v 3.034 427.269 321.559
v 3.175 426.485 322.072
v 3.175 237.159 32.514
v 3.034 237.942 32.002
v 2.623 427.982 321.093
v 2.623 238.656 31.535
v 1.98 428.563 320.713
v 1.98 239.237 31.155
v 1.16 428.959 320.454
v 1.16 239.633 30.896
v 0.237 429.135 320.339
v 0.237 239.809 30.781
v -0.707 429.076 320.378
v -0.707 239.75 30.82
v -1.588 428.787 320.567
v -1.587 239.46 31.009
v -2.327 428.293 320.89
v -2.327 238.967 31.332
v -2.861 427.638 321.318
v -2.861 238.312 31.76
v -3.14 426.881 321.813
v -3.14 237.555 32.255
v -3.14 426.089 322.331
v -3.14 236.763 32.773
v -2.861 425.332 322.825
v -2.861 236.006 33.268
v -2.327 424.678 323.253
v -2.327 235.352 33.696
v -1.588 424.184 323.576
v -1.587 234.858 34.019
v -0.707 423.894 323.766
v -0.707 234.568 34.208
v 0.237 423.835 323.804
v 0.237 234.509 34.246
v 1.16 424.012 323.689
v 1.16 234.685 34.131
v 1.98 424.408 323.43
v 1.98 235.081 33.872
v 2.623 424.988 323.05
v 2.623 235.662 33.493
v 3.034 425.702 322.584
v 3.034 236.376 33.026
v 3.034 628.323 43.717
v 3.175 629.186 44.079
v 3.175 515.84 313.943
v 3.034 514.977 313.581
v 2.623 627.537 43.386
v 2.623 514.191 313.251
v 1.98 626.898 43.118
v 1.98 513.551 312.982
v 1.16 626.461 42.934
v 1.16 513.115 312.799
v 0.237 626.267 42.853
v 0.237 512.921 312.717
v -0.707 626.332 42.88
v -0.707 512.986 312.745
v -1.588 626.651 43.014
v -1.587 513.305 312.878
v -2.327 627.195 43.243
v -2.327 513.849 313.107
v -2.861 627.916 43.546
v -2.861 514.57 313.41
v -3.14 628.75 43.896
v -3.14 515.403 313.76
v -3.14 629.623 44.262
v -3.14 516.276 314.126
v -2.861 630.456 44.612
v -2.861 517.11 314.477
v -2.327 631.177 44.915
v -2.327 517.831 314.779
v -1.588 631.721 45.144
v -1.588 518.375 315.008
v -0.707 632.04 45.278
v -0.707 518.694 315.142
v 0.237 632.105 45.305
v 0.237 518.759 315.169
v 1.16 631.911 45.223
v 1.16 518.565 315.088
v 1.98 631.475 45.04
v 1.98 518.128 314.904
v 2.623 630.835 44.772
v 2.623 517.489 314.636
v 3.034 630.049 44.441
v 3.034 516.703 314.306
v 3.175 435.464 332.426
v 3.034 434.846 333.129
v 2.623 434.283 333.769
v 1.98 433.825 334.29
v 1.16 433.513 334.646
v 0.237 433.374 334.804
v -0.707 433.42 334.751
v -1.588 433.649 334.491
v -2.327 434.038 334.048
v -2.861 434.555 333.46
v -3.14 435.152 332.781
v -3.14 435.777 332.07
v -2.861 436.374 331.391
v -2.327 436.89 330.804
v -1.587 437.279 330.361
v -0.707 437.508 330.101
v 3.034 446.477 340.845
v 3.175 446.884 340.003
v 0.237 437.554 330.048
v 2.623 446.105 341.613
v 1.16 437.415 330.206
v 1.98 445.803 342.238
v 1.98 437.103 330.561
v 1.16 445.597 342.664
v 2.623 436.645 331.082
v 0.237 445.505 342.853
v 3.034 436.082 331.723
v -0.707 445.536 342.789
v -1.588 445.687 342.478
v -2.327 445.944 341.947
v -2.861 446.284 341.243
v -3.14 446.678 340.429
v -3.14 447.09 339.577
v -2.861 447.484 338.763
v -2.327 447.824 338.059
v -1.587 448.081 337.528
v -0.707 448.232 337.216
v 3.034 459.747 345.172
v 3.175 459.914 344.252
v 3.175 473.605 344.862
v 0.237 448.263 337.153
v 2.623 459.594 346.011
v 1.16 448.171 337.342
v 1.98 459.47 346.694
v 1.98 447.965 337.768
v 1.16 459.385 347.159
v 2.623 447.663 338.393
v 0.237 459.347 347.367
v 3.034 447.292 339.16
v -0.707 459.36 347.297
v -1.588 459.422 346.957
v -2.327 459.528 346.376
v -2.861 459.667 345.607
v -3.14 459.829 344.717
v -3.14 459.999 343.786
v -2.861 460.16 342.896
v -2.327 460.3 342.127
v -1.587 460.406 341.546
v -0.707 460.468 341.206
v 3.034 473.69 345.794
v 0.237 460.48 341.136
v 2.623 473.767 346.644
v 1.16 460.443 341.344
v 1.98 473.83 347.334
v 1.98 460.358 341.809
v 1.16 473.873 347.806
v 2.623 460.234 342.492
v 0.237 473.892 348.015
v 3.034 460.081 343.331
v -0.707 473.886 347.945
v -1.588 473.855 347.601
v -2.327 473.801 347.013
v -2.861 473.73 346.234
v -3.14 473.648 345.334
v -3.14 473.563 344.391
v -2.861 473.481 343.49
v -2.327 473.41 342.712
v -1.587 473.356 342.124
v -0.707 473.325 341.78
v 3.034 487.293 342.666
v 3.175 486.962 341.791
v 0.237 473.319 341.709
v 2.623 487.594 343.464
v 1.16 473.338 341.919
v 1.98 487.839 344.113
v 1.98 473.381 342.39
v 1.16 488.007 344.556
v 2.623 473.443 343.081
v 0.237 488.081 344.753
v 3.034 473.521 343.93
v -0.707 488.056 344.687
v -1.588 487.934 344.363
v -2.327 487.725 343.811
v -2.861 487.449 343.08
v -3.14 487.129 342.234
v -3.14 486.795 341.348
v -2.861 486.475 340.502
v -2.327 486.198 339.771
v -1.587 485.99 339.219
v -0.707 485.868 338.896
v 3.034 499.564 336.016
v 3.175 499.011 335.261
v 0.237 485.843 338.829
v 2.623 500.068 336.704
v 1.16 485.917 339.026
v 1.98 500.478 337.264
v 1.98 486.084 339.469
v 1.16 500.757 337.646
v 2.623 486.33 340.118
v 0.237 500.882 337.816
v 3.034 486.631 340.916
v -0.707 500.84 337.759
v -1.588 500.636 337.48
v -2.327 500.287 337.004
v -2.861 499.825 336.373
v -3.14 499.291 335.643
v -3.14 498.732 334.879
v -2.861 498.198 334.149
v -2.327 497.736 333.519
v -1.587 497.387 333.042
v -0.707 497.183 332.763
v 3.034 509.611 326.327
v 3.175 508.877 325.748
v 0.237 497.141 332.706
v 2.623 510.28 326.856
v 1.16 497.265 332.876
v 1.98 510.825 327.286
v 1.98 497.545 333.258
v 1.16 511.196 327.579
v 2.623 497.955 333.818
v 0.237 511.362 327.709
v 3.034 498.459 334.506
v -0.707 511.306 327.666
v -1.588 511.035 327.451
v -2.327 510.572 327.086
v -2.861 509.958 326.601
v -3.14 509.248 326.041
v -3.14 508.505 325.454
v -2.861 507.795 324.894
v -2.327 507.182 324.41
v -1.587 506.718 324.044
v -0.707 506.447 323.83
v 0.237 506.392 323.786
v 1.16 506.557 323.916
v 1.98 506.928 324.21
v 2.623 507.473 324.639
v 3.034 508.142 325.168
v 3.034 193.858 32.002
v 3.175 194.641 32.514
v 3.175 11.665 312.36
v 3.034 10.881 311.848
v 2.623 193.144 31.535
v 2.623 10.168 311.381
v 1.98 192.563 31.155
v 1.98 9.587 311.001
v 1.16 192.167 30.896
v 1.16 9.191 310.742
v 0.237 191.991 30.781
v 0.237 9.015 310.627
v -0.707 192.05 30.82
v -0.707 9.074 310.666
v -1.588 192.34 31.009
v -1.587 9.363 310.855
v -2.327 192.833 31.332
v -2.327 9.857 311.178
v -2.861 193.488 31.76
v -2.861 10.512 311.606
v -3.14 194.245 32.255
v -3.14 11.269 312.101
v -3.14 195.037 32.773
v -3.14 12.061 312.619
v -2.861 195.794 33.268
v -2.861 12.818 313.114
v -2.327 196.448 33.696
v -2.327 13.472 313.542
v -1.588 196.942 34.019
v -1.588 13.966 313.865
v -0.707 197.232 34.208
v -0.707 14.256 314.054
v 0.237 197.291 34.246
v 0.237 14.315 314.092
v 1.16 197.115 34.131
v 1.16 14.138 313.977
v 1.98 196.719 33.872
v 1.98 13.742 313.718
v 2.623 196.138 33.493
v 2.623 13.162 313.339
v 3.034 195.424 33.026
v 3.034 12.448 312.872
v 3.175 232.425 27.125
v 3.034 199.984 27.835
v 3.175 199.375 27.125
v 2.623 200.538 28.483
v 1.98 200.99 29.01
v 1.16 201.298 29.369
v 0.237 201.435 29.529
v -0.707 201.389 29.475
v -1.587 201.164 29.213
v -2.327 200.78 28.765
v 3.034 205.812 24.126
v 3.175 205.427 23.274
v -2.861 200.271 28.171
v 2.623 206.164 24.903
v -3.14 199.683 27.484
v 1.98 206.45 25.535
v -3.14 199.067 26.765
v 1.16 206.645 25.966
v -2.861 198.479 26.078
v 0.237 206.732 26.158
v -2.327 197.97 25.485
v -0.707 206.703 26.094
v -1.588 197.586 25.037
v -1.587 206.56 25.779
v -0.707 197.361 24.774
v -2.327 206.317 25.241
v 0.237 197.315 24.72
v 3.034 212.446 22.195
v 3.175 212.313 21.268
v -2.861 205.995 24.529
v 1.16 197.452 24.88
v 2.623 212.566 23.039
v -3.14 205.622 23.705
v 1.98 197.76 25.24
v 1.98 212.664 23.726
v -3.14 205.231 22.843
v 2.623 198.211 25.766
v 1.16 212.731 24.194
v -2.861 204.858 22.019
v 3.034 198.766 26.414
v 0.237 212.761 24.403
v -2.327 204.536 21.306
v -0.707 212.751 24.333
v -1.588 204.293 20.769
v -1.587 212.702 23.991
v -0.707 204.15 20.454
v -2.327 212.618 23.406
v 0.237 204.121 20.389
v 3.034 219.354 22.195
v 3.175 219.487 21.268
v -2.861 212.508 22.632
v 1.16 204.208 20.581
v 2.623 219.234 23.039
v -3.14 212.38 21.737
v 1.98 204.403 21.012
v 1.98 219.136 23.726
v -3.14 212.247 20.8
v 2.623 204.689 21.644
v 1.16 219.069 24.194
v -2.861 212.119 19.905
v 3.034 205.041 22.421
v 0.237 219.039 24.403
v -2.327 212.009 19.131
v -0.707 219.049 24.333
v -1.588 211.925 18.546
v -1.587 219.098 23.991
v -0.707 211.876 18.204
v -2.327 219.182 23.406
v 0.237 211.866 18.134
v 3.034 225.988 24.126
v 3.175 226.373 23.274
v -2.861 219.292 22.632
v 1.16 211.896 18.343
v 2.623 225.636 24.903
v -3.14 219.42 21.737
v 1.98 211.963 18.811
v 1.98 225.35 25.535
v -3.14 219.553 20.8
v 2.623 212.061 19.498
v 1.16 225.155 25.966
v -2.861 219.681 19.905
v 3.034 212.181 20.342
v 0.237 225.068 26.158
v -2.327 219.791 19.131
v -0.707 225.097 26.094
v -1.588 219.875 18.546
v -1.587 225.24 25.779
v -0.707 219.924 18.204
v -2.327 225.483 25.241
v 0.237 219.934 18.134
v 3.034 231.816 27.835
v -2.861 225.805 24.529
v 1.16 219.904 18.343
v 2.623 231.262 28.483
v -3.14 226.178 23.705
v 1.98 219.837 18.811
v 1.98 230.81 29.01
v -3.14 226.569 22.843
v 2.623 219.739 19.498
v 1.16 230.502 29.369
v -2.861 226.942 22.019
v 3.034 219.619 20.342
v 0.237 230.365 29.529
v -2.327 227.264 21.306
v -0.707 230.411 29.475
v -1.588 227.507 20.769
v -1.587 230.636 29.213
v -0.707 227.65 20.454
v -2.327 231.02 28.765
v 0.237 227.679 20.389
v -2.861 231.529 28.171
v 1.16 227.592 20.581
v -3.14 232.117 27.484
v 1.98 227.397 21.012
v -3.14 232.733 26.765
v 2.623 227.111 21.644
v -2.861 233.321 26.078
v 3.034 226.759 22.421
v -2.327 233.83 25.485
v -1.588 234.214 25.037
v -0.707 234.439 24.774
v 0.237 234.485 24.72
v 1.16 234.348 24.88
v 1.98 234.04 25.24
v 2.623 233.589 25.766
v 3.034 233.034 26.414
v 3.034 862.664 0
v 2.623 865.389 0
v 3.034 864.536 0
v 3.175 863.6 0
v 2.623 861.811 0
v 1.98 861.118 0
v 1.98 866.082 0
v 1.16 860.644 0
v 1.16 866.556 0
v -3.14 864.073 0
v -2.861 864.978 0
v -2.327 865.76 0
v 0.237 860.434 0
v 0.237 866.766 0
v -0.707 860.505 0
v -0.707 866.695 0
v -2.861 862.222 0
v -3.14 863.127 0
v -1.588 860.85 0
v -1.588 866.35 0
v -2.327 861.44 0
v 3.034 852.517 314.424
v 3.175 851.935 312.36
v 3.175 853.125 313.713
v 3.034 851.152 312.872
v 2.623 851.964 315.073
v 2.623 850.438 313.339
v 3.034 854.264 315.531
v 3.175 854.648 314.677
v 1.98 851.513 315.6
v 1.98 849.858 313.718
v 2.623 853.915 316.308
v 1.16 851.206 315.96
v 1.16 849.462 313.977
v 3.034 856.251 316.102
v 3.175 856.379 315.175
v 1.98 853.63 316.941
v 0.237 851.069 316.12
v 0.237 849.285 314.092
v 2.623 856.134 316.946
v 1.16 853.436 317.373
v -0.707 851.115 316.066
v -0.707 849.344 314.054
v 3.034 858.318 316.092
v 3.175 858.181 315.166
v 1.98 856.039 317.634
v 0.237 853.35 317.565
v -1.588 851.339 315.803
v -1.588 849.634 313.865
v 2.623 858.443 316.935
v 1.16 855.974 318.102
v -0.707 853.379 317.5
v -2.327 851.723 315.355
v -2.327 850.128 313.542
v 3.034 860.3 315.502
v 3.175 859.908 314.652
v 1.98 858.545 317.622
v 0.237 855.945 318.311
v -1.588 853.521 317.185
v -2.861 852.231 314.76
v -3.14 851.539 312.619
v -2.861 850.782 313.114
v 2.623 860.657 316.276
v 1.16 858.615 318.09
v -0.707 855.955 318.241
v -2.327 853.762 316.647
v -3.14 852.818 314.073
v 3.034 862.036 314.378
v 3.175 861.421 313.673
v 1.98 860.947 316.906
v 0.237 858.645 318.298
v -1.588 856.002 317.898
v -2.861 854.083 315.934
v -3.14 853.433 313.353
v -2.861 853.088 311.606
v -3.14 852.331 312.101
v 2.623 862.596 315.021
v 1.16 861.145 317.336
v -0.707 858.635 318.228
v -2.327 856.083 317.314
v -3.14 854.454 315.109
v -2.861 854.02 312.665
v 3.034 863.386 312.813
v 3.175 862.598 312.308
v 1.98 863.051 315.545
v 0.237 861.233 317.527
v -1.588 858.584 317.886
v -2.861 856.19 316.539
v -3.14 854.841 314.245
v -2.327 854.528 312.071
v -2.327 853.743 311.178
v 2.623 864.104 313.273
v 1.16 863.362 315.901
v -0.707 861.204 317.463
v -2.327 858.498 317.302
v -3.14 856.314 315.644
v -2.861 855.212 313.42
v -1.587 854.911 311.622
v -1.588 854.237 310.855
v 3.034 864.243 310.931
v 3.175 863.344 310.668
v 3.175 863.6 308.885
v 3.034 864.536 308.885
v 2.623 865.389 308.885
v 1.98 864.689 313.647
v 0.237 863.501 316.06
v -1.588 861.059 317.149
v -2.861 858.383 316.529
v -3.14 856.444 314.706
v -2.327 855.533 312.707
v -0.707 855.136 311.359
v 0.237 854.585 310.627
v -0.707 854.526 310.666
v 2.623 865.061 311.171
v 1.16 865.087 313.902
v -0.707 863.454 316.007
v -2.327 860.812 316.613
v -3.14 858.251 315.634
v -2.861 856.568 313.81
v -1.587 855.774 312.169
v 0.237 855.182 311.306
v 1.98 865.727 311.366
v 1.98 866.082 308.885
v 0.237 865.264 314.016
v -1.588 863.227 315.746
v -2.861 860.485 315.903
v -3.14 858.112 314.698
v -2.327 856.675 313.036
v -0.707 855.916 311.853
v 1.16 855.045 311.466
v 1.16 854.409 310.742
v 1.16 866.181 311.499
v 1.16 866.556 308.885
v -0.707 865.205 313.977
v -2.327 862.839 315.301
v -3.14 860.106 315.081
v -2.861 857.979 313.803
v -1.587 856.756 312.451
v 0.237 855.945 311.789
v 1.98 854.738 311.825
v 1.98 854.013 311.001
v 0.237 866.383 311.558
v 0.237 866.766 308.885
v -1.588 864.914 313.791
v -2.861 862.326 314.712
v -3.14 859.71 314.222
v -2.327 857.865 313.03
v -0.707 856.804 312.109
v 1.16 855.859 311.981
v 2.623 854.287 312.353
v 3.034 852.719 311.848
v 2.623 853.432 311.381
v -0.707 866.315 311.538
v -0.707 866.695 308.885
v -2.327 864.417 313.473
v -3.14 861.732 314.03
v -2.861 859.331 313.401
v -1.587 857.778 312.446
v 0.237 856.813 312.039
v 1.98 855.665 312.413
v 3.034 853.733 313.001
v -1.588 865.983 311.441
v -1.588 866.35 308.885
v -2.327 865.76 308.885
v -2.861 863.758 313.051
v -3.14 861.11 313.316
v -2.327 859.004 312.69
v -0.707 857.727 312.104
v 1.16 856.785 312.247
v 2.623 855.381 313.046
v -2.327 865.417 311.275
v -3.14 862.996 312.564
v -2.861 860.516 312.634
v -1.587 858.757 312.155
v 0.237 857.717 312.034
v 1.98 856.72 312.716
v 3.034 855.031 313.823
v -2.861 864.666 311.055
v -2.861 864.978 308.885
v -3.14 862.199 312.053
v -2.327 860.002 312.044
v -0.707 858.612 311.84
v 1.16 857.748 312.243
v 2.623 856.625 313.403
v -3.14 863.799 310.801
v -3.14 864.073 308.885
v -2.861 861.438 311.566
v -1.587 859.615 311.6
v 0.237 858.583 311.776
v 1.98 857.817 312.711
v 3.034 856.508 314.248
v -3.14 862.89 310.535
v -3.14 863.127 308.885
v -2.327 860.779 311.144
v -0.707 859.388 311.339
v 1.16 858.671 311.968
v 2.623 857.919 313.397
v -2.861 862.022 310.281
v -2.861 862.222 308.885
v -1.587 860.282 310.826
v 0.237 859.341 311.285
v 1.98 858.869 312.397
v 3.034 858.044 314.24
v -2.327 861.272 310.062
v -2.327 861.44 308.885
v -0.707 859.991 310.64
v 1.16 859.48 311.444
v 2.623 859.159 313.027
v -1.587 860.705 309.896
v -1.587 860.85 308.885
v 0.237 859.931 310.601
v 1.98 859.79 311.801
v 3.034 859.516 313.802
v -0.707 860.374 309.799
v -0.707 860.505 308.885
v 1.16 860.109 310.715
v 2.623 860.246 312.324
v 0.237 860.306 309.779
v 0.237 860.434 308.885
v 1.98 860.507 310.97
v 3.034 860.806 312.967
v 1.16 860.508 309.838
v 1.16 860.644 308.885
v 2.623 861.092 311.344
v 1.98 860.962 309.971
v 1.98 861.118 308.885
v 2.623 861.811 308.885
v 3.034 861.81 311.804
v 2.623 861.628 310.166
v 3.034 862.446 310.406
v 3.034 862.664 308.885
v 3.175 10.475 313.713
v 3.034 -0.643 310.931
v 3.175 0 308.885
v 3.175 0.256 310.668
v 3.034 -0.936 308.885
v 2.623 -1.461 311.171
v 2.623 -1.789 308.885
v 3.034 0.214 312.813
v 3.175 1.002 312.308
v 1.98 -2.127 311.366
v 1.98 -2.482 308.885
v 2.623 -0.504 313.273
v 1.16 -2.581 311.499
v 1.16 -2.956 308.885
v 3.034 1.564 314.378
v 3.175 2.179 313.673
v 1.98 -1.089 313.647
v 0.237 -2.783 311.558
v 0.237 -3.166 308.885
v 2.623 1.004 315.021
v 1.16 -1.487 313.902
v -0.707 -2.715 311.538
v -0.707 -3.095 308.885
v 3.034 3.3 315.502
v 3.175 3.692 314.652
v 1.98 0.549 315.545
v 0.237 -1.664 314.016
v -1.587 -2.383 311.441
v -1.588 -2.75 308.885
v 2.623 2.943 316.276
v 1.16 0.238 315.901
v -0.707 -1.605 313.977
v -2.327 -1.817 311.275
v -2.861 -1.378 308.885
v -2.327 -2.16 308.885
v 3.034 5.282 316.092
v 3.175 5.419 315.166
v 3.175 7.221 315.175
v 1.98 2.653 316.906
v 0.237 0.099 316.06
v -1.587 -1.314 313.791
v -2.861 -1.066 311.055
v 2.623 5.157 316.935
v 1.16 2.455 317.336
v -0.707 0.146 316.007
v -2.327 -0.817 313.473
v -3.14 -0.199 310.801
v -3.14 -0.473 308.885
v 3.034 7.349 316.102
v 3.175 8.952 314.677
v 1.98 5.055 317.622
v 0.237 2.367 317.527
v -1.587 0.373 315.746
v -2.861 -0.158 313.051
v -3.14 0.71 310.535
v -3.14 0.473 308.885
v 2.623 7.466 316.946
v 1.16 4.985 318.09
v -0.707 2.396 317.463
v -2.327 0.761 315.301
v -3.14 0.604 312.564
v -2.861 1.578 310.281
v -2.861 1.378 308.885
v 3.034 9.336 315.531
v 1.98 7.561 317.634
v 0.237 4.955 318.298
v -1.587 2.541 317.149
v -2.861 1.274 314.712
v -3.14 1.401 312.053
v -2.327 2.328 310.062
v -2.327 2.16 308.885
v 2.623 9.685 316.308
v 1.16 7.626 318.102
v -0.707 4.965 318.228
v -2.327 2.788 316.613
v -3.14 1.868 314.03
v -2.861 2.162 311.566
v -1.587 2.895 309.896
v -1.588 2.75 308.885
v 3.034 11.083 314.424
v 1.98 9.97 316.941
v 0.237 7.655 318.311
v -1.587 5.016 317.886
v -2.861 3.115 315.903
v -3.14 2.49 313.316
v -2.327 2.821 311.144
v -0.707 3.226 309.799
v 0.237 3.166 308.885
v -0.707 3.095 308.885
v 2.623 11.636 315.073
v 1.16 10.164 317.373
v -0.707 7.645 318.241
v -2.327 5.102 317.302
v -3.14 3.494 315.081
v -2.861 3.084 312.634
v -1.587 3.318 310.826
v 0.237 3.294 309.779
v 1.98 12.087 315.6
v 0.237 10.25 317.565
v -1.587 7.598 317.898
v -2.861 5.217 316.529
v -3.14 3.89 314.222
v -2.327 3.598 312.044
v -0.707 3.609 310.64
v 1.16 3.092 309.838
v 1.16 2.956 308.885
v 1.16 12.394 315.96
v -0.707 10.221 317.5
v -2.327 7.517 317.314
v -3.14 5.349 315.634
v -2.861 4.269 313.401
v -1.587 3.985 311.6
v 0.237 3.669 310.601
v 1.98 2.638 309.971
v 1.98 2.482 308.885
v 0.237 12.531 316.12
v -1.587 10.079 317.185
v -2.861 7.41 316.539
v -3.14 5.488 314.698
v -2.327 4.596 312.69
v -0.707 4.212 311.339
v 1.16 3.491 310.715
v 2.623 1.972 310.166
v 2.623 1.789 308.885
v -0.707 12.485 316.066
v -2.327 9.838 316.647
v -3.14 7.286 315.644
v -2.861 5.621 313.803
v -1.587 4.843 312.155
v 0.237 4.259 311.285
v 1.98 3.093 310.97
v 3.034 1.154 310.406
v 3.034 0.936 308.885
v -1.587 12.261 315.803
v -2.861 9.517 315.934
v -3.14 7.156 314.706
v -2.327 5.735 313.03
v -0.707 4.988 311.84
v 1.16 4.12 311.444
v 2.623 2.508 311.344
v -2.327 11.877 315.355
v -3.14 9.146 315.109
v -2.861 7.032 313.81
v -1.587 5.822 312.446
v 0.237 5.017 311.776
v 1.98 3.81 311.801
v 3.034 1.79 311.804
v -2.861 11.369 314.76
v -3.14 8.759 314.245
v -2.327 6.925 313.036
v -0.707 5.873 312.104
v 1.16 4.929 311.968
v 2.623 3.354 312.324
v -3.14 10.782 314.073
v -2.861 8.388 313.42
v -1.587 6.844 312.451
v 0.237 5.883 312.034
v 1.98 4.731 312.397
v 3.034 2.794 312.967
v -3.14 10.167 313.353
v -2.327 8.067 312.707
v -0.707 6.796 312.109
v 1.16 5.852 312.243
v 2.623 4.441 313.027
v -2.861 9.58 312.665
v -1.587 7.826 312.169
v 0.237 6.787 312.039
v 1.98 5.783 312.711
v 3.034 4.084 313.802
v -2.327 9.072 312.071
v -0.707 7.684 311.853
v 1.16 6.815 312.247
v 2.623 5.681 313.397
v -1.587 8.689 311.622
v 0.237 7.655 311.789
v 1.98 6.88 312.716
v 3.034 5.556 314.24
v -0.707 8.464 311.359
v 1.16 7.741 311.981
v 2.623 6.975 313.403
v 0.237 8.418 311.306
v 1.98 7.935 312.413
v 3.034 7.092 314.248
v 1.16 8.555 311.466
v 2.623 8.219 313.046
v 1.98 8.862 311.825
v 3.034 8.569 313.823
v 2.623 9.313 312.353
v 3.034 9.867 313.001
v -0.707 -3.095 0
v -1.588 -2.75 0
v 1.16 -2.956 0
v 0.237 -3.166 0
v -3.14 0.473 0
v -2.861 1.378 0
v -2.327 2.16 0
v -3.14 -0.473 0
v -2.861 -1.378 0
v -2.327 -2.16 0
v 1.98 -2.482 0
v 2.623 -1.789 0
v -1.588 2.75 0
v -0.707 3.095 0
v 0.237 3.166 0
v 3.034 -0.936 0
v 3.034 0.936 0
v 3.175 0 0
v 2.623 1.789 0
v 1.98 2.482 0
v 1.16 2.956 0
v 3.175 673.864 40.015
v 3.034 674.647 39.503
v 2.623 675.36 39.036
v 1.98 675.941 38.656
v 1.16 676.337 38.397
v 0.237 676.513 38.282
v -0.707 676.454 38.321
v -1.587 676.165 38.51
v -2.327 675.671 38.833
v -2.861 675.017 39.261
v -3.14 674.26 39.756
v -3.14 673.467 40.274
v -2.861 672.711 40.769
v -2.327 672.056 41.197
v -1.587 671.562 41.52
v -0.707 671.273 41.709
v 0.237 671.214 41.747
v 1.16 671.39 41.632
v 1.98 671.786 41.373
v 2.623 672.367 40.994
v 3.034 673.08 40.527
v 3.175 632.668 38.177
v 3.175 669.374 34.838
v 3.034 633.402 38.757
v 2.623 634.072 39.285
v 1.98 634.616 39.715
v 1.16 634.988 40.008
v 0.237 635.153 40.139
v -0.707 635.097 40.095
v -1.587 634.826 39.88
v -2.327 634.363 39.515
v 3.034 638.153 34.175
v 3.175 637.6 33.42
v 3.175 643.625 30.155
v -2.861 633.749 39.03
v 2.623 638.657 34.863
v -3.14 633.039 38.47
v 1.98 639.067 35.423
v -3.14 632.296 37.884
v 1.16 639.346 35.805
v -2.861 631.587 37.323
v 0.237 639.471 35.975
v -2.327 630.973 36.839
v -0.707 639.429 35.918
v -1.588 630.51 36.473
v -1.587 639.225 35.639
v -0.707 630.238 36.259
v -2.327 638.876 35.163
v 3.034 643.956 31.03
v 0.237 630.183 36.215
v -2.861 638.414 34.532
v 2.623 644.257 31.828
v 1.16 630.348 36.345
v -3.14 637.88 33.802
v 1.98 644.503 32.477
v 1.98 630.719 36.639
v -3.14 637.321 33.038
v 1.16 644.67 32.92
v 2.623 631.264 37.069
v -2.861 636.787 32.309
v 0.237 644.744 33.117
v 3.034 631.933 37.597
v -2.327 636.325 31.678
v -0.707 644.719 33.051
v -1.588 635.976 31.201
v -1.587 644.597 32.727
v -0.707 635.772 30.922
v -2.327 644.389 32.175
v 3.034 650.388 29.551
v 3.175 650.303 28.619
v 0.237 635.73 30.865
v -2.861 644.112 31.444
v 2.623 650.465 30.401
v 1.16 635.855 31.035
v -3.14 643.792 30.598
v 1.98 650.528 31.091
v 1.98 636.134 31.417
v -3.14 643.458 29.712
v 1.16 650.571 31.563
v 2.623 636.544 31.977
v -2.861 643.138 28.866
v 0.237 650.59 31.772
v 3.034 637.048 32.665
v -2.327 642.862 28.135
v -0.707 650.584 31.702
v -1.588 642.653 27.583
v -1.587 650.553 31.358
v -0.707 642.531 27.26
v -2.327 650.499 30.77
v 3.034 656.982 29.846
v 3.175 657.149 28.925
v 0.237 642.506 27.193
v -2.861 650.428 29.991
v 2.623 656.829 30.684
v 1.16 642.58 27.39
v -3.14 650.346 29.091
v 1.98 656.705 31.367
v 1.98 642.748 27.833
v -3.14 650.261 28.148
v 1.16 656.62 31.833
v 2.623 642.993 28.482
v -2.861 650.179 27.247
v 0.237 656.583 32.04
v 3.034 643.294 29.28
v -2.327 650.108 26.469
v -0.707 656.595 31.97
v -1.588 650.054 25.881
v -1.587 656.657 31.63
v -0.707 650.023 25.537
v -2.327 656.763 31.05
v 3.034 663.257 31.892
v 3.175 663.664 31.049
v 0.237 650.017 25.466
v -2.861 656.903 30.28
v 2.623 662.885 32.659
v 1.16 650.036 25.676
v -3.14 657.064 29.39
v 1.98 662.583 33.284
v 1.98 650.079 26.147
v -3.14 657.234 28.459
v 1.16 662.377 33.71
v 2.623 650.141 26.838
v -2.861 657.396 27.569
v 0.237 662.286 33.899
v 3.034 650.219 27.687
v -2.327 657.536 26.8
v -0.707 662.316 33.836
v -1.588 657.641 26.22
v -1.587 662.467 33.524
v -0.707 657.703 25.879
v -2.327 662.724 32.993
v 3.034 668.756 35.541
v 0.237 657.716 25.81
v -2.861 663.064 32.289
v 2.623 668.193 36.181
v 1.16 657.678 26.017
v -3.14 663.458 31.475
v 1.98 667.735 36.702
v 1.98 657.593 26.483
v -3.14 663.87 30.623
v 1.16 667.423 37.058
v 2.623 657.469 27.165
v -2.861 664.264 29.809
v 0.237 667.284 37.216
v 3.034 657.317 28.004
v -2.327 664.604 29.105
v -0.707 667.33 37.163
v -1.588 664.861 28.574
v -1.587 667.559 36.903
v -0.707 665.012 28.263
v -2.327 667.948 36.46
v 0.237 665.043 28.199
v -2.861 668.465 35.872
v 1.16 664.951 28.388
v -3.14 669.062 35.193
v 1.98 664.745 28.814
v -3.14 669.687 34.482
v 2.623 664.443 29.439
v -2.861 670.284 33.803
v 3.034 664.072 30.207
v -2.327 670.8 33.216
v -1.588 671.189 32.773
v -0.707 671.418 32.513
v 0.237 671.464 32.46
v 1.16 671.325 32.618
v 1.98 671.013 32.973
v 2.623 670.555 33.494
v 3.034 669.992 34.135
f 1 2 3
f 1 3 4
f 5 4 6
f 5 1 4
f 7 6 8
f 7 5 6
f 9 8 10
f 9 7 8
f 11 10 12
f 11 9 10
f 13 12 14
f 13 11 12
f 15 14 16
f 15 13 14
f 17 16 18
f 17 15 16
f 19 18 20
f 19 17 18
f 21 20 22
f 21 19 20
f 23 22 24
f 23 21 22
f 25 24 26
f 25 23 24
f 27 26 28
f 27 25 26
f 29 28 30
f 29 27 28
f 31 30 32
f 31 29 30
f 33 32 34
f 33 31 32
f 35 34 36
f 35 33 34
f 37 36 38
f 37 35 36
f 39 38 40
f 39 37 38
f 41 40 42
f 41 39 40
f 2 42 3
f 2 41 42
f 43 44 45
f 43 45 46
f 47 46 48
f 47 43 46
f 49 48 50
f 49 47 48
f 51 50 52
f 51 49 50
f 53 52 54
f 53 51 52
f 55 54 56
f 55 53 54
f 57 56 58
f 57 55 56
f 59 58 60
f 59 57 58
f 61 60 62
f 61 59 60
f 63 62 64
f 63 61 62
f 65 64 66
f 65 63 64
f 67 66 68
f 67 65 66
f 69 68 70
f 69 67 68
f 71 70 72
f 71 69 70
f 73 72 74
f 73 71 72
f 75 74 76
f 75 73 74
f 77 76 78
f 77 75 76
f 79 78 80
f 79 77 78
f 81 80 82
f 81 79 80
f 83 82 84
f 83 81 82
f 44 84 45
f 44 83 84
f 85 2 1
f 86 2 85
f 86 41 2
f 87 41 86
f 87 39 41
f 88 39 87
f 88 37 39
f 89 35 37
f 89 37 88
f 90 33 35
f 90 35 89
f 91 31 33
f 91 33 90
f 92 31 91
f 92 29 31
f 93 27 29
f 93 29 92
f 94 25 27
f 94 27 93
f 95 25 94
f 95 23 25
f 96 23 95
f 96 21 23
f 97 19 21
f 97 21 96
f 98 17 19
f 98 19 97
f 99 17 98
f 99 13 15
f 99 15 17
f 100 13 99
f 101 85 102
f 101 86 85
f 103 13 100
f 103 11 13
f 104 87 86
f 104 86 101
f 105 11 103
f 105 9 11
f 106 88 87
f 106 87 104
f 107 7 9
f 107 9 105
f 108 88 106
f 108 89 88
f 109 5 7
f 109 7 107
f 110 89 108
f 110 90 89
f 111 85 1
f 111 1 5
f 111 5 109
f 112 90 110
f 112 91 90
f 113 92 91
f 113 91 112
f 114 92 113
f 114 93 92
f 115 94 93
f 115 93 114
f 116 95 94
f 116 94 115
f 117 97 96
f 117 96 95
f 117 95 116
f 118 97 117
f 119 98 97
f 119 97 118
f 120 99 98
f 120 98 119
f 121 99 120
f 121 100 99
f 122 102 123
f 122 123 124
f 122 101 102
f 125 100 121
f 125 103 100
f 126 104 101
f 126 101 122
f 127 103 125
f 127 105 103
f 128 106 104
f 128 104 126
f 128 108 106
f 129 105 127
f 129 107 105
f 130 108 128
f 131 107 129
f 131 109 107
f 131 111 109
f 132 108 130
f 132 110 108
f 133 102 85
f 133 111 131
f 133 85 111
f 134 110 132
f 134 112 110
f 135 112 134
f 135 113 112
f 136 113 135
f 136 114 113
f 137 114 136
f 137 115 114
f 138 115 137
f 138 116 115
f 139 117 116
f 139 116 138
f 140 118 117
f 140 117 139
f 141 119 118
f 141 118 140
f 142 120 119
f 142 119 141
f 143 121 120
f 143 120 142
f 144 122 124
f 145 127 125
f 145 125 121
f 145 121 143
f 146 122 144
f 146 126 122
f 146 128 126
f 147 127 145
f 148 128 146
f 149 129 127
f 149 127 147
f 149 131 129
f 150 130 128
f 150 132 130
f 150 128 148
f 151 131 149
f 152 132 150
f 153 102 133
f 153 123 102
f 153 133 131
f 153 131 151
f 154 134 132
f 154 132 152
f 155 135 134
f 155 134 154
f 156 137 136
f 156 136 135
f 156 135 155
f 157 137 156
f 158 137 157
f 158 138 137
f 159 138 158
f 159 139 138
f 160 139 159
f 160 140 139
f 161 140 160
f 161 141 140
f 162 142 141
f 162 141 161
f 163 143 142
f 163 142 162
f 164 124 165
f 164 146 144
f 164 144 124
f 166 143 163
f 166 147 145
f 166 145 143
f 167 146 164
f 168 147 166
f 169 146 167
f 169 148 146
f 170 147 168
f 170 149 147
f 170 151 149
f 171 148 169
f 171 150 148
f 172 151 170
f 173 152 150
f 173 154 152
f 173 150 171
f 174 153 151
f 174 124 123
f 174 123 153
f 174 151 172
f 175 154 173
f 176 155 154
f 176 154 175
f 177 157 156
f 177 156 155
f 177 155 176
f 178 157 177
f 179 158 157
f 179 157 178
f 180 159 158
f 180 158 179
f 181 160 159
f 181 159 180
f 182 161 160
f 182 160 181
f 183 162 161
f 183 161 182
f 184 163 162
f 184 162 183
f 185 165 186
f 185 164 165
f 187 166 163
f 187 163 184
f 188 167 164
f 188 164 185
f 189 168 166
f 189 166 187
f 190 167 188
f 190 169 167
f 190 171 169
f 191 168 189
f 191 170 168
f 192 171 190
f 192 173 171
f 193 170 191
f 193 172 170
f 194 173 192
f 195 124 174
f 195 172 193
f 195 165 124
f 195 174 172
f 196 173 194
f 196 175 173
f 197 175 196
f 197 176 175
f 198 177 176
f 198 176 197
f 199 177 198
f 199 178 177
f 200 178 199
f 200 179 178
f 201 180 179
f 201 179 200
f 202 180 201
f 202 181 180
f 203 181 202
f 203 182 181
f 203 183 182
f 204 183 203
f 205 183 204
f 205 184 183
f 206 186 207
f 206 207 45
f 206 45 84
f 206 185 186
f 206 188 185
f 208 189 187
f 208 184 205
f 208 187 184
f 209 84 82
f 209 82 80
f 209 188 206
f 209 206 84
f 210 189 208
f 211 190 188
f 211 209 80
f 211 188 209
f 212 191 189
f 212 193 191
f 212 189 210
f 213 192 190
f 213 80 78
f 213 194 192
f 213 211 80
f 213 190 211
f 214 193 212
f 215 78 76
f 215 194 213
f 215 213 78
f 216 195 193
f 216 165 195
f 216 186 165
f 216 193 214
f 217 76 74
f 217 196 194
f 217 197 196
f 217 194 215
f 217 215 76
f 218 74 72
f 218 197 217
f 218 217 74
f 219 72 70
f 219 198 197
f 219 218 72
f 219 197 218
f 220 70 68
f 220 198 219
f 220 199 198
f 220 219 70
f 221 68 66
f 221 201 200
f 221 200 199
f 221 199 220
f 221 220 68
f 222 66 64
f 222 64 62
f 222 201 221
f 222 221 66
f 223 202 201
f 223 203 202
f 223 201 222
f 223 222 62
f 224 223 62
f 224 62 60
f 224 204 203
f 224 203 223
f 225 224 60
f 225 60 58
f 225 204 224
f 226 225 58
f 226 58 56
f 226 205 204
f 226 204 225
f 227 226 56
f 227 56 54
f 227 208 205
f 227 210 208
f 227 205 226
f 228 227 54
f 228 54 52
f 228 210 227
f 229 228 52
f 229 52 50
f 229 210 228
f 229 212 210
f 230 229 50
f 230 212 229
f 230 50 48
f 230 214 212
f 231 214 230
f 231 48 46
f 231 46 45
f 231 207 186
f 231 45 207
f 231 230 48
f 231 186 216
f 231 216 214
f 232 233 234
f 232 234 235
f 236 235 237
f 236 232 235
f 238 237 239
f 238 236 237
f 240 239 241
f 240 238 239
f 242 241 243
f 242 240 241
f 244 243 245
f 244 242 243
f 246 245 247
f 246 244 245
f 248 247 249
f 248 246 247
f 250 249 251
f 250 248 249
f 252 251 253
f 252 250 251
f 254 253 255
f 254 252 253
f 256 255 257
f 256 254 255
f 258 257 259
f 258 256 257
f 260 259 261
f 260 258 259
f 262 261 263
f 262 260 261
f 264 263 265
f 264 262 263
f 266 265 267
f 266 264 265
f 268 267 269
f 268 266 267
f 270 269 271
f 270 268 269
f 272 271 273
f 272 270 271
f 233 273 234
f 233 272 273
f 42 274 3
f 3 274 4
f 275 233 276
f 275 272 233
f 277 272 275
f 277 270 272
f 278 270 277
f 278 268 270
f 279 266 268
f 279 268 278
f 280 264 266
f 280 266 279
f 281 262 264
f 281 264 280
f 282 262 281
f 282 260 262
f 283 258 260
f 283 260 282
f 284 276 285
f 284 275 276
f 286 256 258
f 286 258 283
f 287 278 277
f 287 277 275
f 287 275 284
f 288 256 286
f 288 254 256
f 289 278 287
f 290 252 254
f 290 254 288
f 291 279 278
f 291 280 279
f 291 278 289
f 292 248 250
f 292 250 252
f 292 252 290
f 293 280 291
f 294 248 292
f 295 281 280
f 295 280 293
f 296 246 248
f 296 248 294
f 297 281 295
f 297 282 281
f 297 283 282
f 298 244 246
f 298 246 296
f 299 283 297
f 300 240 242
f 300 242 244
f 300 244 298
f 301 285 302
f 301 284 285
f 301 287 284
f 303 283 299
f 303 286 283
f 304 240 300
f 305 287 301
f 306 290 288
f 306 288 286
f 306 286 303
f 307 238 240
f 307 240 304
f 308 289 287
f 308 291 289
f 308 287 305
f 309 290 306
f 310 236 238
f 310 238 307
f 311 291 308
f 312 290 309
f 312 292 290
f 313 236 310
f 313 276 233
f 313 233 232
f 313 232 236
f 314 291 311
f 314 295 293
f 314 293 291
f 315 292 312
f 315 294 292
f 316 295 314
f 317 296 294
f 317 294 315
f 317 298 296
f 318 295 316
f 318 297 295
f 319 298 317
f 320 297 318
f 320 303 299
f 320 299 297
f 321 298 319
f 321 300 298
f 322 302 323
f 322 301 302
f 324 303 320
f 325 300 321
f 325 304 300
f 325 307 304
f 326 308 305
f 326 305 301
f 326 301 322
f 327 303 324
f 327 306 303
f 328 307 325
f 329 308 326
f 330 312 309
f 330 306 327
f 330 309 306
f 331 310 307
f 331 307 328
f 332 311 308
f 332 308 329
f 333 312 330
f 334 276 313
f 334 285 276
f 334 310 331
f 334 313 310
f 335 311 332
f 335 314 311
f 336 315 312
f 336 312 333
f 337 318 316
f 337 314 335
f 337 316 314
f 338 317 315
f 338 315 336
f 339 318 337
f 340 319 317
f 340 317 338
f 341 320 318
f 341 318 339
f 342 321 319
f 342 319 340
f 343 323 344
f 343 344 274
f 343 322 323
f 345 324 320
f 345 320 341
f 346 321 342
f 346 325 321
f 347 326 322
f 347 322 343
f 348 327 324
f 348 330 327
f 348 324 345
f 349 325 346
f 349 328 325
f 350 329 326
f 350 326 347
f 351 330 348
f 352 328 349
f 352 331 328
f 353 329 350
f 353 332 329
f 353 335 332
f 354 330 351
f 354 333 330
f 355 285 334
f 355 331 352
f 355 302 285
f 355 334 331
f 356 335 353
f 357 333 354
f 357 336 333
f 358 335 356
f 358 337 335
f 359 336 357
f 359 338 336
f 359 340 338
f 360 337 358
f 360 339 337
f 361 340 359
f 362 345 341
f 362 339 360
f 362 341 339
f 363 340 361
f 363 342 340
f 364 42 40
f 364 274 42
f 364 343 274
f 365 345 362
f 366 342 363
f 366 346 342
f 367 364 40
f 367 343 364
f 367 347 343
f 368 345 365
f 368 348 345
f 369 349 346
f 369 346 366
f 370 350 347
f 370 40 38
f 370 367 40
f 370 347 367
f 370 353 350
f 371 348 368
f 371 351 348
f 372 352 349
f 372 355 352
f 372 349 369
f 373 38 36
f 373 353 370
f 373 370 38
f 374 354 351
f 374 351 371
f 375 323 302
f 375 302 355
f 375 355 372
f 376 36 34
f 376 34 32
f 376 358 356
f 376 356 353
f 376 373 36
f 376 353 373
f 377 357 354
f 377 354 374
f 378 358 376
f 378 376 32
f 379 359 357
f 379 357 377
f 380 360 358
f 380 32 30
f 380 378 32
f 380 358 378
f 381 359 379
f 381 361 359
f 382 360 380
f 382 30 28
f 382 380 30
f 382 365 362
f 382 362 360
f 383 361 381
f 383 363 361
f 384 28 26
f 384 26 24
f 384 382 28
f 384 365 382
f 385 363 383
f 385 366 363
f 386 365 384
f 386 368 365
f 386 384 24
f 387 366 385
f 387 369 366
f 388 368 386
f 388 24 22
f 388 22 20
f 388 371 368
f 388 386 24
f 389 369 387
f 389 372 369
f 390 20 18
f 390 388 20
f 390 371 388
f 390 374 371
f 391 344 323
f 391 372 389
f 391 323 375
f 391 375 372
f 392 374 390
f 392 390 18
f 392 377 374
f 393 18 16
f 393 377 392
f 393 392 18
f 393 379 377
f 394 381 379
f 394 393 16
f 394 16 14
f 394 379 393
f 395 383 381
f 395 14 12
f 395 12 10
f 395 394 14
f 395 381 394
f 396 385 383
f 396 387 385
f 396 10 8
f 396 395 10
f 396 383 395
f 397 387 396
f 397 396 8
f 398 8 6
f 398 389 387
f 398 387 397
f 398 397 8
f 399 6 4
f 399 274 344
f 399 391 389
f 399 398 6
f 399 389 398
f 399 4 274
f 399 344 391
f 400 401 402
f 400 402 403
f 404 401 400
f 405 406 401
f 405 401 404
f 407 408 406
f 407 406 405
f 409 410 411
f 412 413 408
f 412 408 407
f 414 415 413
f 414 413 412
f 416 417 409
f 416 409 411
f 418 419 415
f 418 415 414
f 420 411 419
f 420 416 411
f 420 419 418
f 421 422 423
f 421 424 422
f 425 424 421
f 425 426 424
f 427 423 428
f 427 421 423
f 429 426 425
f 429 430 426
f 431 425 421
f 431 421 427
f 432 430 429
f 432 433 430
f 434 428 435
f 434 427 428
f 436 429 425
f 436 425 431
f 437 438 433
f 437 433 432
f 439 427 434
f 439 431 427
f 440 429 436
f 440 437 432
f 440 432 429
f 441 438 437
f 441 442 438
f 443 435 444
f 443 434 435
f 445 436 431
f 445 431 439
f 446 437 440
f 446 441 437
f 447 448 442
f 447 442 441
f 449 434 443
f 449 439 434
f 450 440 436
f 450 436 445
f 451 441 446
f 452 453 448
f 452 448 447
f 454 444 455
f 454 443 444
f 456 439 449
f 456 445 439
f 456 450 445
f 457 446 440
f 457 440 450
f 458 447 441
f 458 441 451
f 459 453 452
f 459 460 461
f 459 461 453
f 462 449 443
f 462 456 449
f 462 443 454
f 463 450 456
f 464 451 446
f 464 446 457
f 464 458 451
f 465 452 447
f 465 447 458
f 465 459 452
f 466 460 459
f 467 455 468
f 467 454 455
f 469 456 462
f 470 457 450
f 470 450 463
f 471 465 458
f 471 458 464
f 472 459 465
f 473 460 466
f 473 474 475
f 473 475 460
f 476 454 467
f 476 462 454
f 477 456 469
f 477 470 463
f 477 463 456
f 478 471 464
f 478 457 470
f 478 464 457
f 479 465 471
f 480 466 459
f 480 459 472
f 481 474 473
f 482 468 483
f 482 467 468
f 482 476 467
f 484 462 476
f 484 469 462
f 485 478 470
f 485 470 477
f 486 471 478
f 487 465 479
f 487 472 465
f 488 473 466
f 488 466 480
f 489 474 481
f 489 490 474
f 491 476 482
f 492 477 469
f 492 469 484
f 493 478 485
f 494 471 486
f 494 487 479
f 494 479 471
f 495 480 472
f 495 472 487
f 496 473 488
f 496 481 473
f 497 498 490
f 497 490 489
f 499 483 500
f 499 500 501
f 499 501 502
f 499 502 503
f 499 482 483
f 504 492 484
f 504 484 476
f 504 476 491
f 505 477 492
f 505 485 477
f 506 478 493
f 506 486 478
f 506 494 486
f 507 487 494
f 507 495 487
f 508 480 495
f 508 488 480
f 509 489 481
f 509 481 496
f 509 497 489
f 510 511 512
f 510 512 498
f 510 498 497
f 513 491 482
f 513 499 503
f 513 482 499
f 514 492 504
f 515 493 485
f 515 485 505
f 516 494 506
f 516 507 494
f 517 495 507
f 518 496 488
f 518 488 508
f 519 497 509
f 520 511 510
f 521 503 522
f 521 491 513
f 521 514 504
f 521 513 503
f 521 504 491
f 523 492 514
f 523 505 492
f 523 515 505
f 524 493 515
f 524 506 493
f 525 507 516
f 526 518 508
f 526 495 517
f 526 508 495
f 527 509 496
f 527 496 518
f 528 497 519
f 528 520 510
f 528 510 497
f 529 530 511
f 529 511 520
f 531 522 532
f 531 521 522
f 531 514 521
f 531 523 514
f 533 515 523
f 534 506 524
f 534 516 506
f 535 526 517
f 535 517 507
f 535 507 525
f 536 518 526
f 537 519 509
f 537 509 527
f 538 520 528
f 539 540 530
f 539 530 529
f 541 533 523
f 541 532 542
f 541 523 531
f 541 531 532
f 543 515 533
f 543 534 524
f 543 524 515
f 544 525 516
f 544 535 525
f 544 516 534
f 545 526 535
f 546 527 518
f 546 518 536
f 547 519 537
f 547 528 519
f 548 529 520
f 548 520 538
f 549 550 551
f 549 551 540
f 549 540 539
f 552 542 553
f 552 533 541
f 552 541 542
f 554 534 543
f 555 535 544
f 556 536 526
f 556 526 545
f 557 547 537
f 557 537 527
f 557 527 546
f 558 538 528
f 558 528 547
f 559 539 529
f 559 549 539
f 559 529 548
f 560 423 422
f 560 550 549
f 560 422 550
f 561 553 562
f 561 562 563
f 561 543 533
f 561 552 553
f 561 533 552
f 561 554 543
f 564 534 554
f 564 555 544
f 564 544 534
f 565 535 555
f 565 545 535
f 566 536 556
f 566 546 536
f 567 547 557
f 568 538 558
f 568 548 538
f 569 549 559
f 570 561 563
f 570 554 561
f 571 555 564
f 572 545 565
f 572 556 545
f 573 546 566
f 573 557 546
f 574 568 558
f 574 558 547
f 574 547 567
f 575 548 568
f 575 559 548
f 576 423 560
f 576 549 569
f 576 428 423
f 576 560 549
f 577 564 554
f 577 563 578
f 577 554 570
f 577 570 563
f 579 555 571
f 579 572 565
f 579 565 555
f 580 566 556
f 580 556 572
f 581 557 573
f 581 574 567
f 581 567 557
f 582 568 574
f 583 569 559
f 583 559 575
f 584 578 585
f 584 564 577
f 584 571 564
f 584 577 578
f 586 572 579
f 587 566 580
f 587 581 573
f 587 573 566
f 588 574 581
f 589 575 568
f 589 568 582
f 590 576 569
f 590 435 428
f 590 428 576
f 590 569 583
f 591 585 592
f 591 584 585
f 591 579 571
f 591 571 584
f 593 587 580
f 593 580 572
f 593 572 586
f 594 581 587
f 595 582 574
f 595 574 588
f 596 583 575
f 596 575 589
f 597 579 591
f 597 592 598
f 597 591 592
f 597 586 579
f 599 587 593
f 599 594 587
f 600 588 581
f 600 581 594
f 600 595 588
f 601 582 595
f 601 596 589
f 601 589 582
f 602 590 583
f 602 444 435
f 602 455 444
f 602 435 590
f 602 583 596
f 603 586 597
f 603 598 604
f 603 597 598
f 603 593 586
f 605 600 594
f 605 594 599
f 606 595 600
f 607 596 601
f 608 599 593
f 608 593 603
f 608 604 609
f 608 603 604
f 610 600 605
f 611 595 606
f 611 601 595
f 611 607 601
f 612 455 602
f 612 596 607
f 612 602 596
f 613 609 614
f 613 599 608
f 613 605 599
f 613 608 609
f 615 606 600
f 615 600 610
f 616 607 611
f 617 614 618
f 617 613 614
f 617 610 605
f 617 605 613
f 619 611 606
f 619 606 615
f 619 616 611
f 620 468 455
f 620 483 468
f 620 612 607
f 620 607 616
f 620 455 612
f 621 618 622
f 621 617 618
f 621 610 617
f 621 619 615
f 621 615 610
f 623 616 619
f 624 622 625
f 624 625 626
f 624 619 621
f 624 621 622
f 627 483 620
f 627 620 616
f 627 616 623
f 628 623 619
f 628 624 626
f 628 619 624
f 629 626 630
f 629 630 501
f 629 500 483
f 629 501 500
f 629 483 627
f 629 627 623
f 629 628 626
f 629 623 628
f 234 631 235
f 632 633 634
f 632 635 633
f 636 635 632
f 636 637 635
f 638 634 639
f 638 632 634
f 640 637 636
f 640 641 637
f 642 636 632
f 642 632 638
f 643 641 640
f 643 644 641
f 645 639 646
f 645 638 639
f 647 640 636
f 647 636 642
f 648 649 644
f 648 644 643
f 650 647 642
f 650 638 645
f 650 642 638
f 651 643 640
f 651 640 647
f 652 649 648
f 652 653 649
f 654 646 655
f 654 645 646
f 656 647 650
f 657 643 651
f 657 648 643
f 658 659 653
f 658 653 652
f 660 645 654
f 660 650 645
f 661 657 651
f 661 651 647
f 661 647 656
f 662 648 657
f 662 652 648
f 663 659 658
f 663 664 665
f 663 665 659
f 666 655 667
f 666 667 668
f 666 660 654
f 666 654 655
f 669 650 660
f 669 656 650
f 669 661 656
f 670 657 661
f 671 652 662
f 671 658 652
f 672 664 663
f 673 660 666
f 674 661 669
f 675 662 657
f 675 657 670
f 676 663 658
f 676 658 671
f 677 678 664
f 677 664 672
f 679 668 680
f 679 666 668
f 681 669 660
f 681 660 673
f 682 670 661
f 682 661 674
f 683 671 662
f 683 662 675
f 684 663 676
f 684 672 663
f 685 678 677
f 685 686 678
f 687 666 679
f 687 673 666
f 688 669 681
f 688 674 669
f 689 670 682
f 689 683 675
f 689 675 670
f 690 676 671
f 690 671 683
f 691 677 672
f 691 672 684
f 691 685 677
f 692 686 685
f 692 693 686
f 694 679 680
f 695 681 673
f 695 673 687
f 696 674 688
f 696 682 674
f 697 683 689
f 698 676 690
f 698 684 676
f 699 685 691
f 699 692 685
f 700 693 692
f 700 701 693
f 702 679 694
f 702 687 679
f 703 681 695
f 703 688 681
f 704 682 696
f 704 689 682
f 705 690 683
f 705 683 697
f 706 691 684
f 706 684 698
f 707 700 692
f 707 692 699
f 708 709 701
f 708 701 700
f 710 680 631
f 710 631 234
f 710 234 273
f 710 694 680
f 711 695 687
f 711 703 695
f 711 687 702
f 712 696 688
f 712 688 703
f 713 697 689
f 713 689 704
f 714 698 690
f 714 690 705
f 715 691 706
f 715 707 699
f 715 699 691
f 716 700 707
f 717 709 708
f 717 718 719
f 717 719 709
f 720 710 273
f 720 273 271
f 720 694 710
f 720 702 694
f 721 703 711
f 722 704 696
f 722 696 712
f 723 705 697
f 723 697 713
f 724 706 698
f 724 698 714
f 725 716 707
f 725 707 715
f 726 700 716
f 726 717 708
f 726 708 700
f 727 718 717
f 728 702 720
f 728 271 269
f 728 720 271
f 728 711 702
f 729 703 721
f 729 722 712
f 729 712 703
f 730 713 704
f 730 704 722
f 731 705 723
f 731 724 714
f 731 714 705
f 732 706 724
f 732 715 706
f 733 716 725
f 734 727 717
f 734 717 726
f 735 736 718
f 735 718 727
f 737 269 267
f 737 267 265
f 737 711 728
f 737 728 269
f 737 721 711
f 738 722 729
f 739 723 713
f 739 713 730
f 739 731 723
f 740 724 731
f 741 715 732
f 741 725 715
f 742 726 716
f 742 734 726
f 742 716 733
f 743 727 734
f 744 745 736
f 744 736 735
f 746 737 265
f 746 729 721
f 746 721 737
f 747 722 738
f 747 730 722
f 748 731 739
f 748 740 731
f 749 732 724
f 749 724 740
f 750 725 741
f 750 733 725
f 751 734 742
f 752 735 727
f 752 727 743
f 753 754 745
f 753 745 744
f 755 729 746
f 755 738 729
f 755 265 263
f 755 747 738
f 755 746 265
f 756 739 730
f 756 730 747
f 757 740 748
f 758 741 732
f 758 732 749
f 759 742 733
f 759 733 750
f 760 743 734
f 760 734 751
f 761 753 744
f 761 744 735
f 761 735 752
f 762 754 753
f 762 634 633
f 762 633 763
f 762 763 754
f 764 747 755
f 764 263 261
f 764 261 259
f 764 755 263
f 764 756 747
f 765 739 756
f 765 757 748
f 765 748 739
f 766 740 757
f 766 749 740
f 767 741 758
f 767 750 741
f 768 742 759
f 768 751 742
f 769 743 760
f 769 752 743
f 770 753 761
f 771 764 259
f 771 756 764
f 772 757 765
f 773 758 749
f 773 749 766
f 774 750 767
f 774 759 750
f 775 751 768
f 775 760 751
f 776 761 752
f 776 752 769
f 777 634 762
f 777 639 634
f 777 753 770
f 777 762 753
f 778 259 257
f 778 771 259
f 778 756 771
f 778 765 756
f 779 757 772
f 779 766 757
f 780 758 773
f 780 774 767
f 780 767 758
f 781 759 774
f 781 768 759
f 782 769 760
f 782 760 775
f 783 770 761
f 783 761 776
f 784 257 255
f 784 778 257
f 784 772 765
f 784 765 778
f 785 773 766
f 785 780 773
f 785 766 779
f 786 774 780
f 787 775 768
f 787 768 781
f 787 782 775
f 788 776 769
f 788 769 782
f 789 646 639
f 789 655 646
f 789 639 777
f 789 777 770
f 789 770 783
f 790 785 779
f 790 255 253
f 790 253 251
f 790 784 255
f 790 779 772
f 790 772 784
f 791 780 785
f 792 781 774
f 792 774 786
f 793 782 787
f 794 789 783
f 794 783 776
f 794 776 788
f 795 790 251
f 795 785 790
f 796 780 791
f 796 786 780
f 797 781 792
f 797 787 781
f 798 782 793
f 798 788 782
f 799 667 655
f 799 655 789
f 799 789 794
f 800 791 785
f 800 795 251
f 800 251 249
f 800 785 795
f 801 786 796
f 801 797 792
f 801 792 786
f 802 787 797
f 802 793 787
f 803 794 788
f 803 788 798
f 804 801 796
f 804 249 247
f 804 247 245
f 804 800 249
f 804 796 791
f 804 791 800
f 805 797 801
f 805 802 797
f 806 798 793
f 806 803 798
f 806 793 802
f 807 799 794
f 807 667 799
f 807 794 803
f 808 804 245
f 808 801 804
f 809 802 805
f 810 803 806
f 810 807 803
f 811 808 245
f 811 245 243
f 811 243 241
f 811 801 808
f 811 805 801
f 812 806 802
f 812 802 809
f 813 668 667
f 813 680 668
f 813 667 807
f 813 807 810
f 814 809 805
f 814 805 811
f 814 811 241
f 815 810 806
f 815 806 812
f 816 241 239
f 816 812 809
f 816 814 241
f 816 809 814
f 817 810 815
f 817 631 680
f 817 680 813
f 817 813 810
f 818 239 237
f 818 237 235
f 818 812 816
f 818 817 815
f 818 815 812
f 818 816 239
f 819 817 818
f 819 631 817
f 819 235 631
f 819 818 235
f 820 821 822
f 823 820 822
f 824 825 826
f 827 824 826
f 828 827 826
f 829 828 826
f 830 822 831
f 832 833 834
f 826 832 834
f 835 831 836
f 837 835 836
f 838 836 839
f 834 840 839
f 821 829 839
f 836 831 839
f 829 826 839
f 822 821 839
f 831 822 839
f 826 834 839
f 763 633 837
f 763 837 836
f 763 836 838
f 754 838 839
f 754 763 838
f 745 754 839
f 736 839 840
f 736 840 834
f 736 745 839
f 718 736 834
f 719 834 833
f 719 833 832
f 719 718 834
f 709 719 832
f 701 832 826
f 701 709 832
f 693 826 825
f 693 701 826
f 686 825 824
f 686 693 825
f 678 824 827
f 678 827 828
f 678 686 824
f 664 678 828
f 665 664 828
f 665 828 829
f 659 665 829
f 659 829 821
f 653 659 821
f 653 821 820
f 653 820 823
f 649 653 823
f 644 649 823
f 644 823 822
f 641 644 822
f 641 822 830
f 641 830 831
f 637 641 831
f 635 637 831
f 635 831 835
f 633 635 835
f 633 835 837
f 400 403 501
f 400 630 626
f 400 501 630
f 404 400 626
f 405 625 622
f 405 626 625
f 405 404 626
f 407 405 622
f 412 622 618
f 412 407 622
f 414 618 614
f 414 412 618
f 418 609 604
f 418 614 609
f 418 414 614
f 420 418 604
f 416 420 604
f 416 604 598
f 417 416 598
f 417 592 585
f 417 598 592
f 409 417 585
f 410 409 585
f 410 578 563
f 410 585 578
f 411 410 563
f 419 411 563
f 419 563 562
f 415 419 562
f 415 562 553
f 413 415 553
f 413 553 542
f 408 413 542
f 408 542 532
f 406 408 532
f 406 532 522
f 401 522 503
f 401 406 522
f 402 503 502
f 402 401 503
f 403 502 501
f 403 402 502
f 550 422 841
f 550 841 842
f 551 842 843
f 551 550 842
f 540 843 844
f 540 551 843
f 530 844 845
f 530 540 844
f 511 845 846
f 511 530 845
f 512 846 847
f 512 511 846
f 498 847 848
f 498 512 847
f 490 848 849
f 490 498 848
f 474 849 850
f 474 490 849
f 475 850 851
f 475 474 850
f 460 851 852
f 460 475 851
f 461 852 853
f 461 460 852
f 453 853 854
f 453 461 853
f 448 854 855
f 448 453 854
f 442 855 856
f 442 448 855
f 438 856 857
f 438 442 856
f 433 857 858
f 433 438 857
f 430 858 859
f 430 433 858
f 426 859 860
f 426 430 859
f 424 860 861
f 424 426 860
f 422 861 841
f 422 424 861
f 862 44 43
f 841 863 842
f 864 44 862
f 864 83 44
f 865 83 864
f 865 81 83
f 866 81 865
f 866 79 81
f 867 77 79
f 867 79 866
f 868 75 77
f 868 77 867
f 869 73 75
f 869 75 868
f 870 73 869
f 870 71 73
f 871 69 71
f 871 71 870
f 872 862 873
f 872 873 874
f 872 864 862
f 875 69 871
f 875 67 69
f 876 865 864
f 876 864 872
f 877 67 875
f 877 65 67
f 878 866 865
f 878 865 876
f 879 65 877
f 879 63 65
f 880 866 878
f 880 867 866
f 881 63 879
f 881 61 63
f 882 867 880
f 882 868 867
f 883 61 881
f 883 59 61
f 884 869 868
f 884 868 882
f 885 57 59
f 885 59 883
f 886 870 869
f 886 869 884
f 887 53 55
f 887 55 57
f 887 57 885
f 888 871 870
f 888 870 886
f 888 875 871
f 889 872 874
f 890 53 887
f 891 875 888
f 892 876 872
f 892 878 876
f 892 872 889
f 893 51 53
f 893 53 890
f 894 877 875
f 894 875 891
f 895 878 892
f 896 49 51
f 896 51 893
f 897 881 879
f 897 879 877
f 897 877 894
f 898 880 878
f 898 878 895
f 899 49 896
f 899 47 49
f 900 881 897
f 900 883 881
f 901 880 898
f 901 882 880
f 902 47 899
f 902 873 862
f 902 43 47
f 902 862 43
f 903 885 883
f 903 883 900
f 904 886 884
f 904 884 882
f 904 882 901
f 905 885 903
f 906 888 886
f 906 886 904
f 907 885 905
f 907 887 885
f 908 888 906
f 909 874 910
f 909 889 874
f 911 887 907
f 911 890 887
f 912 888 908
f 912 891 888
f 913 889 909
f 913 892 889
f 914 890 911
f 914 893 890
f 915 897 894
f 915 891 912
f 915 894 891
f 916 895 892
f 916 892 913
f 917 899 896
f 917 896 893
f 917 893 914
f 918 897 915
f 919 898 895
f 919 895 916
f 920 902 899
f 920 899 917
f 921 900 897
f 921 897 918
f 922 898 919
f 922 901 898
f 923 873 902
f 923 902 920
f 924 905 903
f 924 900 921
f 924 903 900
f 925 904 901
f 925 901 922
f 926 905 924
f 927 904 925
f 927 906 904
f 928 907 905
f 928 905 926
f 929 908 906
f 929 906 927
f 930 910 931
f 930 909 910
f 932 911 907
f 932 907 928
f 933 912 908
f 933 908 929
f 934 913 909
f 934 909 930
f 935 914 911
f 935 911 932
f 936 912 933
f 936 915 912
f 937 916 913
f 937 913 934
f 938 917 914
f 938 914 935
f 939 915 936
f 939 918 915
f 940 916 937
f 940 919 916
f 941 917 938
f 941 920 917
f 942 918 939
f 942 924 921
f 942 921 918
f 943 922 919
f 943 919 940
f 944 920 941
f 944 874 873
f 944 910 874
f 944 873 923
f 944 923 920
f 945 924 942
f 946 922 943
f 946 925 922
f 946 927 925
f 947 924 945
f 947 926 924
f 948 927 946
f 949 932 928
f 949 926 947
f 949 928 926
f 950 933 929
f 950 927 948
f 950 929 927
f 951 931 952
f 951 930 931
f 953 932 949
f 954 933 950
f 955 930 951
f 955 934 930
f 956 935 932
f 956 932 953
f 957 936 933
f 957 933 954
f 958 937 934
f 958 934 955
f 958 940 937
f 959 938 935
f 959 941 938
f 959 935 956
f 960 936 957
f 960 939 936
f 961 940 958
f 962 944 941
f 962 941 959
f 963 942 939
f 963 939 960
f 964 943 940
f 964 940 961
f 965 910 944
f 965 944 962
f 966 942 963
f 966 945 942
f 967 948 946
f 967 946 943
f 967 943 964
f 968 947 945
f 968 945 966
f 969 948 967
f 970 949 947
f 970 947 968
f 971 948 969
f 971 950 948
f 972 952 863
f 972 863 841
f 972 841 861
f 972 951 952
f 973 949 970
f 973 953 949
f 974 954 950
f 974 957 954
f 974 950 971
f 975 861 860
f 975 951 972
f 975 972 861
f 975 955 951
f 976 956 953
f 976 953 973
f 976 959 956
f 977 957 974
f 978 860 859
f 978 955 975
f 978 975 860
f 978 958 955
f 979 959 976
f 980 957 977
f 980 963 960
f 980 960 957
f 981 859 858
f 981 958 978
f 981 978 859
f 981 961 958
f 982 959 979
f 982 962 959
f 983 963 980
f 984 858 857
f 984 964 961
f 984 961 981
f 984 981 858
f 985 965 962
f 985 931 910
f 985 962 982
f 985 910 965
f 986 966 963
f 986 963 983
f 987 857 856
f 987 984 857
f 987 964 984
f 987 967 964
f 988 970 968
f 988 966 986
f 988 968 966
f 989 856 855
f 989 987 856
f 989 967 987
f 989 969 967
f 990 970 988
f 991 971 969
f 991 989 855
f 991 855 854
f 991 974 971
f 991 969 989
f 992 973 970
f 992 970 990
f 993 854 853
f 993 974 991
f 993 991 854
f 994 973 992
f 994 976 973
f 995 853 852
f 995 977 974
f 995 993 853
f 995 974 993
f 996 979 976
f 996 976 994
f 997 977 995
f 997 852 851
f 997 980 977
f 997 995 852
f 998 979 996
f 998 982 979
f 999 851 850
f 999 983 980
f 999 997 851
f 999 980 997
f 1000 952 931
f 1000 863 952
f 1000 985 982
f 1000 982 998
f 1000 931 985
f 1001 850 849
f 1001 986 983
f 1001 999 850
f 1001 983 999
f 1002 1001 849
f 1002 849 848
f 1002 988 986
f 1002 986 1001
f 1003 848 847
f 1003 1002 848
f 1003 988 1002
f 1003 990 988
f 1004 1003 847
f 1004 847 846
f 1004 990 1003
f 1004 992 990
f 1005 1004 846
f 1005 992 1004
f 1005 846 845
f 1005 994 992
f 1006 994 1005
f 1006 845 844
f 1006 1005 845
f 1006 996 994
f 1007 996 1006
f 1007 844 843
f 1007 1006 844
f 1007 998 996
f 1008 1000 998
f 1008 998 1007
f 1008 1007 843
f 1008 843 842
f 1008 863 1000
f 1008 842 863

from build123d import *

# Parameters (mm, degrees)
F1_R = 3.175


with BuildPart() as f2:
    # F2: sweep along a path in F0
    with BuildLine(Plane.YZ) as f2_path:
        Line((0, 0), (0, 308.88475))
        ThreePointArc((0, 308.88475), (4.53702, 314.970438), (11.664757, 312.359783))
        Line((11.664757, 312.359783), (194.640972, 32.513808))
        ThreePointArc((194.640972, 32.513808), (215.9, 21.013942), (237.159028, 32.513808))
        Line((237.159028, 32.513808), (426.485243, 322.071548))
        ThreePointArc((426.485243, 322.071548), (473.605436, 344.86239), (515.839773, 313.943208))
        Line((515.839773, 313.943208), (629.186259, 44.078972))
        ThreePointArc((629.186259, 44.078972), (650.303428, 28.619381), (673.863524, 40.014802))
        Line((673.863524, 40.014802), (851.935243, 312.359783))
        ThreePointArc((851.935243, 312.359783), (859.06298, 314.970438), (863.6, 308.88475))
        Line((863.6, 308.88475), (863.6, 0))
    # F1 (on Top) → F2 (sweep)
    with BuildSketch(Plane.XY):
        Circle(F1_R)
    sweep(path=f2_path.line)


solid = f2.part
